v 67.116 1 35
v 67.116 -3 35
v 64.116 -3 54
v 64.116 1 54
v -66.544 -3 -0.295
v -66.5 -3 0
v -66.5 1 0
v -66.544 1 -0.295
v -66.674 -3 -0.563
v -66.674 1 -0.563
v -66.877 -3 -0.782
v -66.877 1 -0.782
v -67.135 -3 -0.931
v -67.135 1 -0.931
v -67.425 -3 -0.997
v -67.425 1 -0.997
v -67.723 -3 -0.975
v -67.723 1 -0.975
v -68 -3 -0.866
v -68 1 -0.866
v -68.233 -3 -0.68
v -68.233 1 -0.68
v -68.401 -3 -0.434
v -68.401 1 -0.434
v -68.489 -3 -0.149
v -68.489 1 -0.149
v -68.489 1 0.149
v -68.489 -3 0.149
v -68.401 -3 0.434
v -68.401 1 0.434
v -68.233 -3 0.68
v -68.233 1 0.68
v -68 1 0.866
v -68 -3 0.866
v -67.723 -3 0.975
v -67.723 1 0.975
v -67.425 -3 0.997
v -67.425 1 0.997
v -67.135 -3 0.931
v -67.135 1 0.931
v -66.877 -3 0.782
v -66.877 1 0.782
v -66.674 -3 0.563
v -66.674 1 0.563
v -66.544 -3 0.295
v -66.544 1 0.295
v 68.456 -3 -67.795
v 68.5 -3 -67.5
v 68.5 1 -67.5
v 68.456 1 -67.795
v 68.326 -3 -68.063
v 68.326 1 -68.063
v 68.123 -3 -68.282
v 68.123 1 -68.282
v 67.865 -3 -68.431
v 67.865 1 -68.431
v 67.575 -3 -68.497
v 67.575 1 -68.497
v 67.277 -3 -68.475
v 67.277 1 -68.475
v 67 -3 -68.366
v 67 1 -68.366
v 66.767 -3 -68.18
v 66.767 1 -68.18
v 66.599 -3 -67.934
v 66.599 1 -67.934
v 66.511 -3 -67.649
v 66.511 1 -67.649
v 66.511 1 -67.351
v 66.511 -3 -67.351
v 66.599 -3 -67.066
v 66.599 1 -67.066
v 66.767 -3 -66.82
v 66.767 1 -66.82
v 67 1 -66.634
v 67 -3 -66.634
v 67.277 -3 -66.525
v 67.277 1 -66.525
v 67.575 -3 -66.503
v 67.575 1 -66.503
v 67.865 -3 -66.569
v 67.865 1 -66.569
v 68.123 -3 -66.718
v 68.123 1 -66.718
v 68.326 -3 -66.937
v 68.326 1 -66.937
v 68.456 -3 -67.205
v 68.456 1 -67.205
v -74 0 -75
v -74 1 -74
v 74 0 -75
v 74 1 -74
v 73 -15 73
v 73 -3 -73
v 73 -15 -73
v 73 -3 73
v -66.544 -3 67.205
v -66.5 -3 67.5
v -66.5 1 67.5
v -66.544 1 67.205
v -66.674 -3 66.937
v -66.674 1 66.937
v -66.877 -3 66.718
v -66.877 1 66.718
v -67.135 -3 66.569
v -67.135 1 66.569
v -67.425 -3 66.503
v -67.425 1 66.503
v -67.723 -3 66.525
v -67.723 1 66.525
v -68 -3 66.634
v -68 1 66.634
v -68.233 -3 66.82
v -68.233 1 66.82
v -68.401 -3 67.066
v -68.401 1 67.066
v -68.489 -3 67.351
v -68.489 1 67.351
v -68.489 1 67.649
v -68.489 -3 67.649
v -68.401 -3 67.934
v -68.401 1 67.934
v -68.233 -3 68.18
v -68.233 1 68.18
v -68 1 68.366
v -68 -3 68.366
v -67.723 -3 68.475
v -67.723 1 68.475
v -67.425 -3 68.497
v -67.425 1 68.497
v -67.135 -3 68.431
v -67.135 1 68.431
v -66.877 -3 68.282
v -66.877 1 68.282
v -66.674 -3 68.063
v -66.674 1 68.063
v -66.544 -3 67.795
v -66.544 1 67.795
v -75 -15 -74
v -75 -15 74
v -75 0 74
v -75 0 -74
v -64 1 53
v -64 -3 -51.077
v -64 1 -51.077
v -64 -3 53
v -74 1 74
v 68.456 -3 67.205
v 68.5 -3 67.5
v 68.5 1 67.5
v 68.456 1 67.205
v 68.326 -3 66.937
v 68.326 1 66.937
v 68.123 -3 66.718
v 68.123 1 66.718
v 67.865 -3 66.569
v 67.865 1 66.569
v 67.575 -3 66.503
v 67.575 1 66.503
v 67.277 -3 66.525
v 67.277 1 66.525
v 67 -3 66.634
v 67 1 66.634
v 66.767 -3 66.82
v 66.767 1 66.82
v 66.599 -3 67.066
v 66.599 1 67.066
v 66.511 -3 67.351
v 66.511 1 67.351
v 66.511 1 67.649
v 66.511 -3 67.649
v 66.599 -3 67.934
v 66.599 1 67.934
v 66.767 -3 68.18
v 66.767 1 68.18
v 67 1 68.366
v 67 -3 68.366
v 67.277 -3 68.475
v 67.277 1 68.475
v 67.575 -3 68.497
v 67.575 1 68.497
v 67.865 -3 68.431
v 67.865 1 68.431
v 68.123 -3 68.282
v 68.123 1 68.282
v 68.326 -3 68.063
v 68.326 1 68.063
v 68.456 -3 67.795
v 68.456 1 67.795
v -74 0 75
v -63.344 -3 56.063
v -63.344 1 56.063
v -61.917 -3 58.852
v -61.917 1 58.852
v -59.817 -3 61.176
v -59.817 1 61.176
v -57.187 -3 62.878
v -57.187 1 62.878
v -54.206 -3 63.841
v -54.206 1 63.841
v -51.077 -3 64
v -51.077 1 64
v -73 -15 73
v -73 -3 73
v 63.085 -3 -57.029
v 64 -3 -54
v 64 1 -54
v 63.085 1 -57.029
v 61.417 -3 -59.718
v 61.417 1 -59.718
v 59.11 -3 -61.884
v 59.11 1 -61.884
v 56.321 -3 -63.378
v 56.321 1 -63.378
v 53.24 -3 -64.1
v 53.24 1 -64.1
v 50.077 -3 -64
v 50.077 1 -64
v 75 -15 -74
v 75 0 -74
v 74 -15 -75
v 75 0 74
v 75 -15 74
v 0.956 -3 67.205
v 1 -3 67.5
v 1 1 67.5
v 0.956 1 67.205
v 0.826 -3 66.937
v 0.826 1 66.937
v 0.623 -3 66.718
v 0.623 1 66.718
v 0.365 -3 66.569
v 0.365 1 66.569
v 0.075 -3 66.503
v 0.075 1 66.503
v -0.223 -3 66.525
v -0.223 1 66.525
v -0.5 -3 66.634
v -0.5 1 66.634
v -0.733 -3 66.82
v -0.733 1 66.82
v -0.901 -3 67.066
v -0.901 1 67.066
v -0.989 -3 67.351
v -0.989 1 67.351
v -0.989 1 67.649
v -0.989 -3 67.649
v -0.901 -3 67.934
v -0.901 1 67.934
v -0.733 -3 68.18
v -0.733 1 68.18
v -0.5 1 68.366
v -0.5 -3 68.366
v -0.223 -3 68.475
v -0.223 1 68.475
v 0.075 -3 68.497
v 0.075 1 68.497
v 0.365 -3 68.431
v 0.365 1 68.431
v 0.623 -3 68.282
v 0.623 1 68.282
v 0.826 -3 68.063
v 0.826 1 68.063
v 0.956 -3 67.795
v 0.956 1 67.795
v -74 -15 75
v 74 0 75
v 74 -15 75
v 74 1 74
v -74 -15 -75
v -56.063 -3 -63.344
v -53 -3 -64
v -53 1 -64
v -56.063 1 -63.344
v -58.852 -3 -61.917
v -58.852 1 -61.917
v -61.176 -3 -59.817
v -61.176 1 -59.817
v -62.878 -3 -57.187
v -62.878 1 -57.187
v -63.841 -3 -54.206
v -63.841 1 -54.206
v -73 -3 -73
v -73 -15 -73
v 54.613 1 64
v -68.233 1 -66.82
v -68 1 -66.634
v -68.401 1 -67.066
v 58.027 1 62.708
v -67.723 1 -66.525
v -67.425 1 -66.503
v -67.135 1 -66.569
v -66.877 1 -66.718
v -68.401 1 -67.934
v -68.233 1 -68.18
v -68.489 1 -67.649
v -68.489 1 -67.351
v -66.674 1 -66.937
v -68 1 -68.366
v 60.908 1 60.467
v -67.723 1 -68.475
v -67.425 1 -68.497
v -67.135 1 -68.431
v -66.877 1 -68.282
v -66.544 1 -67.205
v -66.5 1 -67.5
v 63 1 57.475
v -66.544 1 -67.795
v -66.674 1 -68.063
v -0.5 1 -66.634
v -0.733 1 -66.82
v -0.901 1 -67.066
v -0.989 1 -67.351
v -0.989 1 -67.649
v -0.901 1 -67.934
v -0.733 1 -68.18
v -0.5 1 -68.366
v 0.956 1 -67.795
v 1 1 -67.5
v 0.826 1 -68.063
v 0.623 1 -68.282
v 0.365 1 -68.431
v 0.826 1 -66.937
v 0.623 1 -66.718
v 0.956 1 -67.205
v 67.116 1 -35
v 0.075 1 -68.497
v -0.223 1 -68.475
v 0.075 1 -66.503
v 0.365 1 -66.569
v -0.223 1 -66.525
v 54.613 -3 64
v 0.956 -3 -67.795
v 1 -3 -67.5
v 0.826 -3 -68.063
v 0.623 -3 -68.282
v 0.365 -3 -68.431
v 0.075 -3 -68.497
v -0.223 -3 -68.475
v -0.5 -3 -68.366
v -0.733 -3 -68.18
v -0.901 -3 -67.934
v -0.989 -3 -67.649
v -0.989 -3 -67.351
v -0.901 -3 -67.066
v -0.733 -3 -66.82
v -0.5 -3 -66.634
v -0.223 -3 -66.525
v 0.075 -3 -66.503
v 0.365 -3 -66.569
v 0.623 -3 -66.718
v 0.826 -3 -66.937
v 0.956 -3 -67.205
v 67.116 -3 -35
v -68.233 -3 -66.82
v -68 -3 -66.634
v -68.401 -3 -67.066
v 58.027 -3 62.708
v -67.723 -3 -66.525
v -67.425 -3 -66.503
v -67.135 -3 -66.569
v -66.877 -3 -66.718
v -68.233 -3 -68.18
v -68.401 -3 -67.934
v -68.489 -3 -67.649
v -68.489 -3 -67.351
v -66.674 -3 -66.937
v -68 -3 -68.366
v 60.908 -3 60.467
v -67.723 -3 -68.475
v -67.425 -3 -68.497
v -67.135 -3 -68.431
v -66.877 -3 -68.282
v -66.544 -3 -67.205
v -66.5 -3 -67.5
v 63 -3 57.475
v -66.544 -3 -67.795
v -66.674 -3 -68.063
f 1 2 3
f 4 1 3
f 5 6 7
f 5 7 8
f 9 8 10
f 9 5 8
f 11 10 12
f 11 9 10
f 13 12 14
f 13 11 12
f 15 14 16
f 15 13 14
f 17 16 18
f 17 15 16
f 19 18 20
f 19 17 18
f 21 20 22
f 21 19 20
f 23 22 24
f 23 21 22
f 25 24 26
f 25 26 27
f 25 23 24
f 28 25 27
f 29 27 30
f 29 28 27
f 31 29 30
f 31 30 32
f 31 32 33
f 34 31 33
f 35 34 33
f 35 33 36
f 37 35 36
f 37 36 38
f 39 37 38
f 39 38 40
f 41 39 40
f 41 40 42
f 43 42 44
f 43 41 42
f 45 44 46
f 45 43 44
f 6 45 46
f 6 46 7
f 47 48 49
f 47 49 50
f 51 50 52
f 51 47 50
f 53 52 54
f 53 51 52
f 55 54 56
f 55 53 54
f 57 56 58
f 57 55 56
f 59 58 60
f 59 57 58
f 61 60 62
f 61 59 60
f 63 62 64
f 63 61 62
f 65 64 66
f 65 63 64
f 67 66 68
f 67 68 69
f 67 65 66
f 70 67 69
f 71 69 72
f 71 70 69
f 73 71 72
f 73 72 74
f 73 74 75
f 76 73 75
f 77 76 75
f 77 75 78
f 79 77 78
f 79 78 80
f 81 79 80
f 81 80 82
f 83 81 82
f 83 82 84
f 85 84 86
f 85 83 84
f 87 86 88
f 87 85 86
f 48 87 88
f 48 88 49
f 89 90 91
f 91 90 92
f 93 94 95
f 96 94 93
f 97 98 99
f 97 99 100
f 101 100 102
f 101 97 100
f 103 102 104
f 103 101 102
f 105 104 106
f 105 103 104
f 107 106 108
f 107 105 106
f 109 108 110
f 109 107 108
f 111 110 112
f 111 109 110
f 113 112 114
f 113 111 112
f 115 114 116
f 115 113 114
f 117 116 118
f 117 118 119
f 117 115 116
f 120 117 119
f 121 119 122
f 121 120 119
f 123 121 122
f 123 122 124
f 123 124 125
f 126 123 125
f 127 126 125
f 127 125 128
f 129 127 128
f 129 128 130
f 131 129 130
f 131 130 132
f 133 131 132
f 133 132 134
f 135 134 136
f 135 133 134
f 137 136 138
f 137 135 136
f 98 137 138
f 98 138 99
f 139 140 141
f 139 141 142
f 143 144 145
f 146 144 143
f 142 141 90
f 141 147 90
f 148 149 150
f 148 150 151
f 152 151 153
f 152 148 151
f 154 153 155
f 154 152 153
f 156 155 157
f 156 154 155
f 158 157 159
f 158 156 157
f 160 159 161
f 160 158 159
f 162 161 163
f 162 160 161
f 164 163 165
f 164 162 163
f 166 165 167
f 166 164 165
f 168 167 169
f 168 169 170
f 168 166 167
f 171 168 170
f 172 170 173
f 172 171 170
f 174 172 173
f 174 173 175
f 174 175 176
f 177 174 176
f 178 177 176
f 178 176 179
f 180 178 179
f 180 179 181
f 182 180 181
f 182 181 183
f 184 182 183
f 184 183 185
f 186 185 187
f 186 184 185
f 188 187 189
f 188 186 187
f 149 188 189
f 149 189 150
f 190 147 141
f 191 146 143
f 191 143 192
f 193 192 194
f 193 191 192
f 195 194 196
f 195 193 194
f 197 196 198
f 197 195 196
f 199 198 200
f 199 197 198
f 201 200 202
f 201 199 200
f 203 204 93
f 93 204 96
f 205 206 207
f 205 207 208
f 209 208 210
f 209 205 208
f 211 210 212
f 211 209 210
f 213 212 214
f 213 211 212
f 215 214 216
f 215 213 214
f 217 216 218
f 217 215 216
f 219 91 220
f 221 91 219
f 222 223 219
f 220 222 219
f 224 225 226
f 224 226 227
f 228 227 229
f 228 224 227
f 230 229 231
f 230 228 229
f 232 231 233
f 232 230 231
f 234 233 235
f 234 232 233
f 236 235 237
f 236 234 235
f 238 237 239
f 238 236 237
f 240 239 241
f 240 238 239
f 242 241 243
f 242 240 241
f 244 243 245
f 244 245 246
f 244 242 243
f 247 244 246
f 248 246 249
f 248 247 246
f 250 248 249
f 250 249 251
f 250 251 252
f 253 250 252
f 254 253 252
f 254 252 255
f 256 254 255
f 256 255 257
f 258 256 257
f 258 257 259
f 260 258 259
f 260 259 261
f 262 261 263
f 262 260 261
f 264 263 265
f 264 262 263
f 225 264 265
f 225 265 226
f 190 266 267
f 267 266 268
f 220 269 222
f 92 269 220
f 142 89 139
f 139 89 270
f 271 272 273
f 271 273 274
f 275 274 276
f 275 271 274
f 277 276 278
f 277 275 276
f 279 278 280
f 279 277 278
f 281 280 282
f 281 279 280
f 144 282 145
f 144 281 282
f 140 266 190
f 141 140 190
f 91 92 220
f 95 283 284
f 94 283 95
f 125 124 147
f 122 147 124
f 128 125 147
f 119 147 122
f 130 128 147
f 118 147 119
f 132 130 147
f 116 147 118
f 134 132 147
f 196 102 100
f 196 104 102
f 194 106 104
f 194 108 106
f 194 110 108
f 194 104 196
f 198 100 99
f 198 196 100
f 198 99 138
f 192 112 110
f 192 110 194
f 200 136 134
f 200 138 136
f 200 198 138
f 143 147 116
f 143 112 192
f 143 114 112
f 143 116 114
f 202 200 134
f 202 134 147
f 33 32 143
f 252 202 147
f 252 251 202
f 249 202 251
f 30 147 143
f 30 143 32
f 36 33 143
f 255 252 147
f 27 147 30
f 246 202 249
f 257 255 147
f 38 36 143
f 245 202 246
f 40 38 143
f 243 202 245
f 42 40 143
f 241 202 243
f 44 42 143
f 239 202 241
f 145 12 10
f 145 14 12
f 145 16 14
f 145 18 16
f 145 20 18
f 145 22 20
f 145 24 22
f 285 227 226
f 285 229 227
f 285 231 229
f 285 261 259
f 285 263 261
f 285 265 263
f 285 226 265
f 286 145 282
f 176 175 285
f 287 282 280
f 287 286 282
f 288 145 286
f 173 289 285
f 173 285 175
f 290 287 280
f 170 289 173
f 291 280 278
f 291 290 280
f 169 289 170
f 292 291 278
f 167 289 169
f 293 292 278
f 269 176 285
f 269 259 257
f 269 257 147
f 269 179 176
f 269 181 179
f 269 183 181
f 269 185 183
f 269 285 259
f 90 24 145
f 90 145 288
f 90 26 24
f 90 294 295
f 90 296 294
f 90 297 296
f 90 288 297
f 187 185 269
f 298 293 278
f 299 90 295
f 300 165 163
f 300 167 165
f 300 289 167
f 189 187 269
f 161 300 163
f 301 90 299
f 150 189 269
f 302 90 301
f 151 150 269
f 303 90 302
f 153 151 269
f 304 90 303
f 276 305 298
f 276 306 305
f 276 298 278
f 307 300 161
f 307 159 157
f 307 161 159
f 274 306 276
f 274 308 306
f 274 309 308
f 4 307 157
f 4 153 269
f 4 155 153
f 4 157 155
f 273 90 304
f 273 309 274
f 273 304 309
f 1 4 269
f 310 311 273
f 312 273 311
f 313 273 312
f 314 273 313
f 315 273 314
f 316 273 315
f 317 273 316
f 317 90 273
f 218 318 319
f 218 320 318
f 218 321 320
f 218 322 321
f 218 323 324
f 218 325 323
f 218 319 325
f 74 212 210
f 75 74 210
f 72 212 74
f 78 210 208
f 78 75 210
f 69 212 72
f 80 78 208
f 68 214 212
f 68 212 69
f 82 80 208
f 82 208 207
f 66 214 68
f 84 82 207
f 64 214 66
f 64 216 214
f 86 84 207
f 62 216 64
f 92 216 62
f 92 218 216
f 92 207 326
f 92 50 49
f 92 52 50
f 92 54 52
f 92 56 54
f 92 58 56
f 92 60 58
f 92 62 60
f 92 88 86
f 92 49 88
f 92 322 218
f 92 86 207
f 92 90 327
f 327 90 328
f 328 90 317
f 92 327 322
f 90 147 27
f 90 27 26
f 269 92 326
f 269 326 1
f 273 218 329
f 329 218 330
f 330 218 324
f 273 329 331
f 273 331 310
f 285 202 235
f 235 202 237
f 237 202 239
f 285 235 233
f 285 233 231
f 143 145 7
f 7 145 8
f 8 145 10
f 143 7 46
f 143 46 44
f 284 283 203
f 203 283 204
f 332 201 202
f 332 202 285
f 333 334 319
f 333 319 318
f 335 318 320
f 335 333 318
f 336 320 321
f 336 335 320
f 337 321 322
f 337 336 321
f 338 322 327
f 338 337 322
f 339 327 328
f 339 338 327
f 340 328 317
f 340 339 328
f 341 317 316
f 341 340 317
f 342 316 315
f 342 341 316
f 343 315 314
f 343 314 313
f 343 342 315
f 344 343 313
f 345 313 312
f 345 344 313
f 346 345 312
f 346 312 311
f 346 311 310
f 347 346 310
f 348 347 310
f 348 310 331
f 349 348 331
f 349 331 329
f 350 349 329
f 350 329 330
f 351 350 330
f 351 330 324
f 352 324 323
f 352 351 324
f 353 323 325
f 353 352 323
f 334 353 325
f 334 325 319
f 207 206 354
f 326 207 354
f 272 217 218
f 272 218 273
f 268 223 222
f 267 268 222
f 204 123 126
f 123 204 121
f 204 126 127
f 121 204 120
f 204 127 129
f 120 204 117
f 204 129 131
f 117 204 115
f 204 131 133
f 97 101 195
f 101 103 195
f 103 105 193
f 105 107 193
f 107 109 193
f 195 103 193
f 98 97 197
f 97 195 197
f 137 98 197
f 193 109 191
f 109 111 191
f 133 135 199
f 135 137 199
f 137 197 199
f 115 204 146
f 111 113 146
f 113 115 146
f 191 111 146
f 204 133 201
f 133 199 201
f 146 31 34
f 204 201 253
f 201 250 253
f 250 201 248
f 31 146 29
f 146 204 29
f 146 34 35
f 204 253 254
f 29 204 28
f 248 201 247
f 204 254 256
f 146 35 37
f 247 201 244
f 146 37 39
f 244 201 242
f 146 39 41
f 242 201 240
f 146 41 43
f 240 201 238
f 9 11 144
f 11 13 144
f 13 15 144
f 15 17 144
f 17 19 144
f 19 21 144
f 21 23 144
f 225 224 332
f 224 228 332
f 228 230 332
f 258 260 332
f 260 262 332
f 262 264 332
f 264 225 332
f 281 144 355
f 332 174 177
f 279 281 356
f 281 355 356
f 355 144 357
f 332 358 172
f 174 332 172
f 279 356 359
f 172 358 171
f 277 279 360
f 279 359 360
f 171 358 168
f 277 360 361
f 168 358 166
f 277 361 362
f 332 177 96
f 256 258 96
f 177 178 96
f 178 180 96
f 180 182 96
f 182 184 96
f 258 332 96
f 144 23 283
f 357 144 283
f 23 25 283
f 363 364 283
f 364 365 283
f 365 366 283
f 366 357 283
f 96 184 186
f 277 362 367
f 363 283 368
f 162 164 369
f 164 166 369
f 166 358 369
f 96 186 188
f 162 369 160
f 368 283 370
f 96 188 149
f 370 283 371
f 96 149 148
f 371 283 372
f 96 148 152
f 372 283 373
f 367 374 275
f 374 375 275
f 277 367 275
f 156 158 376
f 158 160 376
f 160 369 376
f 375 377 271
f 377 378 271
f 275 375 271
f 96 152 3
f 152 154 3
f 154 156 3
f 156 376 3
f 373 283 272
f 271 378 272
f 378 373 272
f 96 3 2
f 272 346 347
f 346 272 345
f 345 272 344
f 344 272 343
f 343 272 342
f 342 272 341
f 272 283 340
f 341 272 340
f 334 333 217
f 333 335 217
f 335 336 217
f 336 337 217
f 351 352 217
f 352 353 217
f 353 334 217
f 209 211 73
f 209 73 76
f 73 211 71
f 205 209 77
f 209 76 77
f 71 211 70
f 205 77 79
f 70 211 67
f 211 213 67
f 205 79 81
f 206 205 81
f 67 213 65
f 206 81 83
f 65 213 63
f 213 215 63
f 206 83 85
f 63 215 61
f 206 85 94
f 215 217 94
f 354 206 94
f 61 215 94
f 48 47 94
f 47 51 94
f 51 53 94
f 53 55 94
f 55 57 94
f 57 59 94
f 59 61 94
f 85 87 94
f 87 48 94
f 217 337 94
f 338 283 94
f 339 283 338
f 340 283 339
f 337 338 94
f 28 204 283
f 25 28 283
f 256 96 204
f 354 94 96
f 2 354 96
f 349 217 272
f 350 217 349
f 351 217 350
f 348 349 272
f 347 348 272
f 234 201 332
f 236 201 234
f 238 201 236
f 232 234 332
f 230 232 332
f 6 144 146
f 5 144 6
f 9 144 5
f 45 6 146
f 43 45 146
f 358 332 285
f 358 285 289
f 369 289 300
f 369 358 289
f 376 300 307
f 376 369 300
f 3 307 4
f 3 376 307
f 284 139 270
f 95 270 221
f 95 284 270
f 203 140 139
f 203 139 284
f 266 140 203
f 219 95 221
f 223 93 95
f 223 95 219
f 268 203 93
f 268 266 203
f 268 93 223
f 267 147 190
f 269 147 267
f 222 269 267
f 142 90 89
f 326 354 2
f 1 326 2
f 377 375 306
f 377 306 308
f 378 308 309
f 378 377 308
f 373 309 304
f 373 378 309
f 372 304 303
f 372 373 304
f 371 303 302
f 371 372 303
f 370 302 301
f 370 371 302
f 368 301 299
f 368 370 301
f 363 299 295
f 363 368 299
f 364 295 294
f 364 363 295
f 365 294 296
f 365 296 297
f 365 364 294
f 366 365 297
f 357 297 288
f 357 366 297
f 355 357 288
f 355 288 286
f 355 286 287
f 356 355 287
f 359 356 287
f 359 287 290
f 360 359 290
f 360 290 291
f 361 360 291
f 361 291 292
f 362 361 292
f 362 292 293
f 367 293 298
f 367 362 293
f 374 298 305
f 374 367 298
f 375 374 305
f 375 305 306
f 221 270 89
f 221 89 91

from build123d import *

# Parameters (mm, degrees)
SKETCH009_W     = 150
SKETCH009_H     = 150
SKETCH009_W_2   = 146
SKETCH009_H_2   = 146
PAD003_DEPTH    = 12
SKETCH010_W     = 150
SKETCH010_H     = 150
SKETCH010_R     = 1
PAD004_DEPTH    = 4
CHAMFER003_SIZE = 1


with BuildPart() as part:
    # Sketch009 → Pad003 (new body)
    with BuildSketch(Plane.XZ):
        Rectangle(SKETCH009_W, SKETCH009_H)
        Rectangle(SKETCH009_W_2, SKETCH009_H_2, mode=Mode.SUBTRACT)
    extrude(amount=PAD003_DEPTH)

    # Sketch010 (on Face9 of Pad003) → Pad004 (join)
    with BuildSketch(Plane(origin=(0, 0, 0), x_dir=(1, 0, 0), z_dir=(0, 1, 0))):
        Rectangle(SKETCH010_W, SKETCH010_H)
        with Locations((-67.5, 67.5)):
            Circle(SKETCH010_R, mode=Mode.SUBTRACT)
        with Locations((67.5, 67.5)):
            Circle(SKETCH010_R, mode=Mode.SUBTRACT)
        with Locations((0, 67.5)):
            Circle(SKETCH010_R, mode=Mode.SUBTRACT)
        with Locations((-67.5, 0)):
            Circle(SKETCH010_R, mode=Mode.SUBTRACT)
        with Locations((-67.5, -67.5)):
            Circle(SKETCH010_R, mode=Mode.SUBTRACT)
        with Locations((0, -67.5)):
            Circle(SKETCH010_R, mode=Mode.SUBTRACT)
        with Locations((67.5, -67.5)):
            Circle(SKETCH010_R, mode=Mode.SUBTRACT)
        with BuildLine():
            ThreePointArc((-53, 64), (-61.176409, 59.816751), (-64, 51.077152))
            Line((-64, 51.077152), (-64, -53))
            ThreePointArc((-64, -53), (-59.816751, -61.176409), (-51.077152, -64))
            Line((-51.077152, -64), (54.6127, -64))
            ThreePointArc((54.6127, -64), (60.907852, -60.466964), (64.115604, -54))
            Line((67.115604, -35), (64.115604, -54))
            Line((67.115604, 35), (67.115604, -35))
            Line((64, 54), (67.115604, 35))
            ThreePointArc((64, 54), (59.109644, 61.883516), (50.077152, 64))
            Line((50.077152, 64), (-53, 64))
        make_face(mode=Mode.SUBTRACT)
    extrude(amount=PAD004_DEPTH)

    # Chamfer003
    chamfer003_edges = [part.edges().sort_by_distance(p)[0] for p in [
        (0, 4, -75),
        (-75, 4, 0),
        (0, 4, 75),
        (75, 4, 0),
        (75, 2, -75),
        (75, -6, 75),
        (-75, -6, -75),
        (-75, -6, 75),
    ]]
    chamfer(chamfer003_edges, length=CHAMFER003_SIZE)


with BuildPart() as part_1:
    # Body001 placement: moved
    add(part.part.moved(Location((0, -3, 0))))


solid = part_1.part
